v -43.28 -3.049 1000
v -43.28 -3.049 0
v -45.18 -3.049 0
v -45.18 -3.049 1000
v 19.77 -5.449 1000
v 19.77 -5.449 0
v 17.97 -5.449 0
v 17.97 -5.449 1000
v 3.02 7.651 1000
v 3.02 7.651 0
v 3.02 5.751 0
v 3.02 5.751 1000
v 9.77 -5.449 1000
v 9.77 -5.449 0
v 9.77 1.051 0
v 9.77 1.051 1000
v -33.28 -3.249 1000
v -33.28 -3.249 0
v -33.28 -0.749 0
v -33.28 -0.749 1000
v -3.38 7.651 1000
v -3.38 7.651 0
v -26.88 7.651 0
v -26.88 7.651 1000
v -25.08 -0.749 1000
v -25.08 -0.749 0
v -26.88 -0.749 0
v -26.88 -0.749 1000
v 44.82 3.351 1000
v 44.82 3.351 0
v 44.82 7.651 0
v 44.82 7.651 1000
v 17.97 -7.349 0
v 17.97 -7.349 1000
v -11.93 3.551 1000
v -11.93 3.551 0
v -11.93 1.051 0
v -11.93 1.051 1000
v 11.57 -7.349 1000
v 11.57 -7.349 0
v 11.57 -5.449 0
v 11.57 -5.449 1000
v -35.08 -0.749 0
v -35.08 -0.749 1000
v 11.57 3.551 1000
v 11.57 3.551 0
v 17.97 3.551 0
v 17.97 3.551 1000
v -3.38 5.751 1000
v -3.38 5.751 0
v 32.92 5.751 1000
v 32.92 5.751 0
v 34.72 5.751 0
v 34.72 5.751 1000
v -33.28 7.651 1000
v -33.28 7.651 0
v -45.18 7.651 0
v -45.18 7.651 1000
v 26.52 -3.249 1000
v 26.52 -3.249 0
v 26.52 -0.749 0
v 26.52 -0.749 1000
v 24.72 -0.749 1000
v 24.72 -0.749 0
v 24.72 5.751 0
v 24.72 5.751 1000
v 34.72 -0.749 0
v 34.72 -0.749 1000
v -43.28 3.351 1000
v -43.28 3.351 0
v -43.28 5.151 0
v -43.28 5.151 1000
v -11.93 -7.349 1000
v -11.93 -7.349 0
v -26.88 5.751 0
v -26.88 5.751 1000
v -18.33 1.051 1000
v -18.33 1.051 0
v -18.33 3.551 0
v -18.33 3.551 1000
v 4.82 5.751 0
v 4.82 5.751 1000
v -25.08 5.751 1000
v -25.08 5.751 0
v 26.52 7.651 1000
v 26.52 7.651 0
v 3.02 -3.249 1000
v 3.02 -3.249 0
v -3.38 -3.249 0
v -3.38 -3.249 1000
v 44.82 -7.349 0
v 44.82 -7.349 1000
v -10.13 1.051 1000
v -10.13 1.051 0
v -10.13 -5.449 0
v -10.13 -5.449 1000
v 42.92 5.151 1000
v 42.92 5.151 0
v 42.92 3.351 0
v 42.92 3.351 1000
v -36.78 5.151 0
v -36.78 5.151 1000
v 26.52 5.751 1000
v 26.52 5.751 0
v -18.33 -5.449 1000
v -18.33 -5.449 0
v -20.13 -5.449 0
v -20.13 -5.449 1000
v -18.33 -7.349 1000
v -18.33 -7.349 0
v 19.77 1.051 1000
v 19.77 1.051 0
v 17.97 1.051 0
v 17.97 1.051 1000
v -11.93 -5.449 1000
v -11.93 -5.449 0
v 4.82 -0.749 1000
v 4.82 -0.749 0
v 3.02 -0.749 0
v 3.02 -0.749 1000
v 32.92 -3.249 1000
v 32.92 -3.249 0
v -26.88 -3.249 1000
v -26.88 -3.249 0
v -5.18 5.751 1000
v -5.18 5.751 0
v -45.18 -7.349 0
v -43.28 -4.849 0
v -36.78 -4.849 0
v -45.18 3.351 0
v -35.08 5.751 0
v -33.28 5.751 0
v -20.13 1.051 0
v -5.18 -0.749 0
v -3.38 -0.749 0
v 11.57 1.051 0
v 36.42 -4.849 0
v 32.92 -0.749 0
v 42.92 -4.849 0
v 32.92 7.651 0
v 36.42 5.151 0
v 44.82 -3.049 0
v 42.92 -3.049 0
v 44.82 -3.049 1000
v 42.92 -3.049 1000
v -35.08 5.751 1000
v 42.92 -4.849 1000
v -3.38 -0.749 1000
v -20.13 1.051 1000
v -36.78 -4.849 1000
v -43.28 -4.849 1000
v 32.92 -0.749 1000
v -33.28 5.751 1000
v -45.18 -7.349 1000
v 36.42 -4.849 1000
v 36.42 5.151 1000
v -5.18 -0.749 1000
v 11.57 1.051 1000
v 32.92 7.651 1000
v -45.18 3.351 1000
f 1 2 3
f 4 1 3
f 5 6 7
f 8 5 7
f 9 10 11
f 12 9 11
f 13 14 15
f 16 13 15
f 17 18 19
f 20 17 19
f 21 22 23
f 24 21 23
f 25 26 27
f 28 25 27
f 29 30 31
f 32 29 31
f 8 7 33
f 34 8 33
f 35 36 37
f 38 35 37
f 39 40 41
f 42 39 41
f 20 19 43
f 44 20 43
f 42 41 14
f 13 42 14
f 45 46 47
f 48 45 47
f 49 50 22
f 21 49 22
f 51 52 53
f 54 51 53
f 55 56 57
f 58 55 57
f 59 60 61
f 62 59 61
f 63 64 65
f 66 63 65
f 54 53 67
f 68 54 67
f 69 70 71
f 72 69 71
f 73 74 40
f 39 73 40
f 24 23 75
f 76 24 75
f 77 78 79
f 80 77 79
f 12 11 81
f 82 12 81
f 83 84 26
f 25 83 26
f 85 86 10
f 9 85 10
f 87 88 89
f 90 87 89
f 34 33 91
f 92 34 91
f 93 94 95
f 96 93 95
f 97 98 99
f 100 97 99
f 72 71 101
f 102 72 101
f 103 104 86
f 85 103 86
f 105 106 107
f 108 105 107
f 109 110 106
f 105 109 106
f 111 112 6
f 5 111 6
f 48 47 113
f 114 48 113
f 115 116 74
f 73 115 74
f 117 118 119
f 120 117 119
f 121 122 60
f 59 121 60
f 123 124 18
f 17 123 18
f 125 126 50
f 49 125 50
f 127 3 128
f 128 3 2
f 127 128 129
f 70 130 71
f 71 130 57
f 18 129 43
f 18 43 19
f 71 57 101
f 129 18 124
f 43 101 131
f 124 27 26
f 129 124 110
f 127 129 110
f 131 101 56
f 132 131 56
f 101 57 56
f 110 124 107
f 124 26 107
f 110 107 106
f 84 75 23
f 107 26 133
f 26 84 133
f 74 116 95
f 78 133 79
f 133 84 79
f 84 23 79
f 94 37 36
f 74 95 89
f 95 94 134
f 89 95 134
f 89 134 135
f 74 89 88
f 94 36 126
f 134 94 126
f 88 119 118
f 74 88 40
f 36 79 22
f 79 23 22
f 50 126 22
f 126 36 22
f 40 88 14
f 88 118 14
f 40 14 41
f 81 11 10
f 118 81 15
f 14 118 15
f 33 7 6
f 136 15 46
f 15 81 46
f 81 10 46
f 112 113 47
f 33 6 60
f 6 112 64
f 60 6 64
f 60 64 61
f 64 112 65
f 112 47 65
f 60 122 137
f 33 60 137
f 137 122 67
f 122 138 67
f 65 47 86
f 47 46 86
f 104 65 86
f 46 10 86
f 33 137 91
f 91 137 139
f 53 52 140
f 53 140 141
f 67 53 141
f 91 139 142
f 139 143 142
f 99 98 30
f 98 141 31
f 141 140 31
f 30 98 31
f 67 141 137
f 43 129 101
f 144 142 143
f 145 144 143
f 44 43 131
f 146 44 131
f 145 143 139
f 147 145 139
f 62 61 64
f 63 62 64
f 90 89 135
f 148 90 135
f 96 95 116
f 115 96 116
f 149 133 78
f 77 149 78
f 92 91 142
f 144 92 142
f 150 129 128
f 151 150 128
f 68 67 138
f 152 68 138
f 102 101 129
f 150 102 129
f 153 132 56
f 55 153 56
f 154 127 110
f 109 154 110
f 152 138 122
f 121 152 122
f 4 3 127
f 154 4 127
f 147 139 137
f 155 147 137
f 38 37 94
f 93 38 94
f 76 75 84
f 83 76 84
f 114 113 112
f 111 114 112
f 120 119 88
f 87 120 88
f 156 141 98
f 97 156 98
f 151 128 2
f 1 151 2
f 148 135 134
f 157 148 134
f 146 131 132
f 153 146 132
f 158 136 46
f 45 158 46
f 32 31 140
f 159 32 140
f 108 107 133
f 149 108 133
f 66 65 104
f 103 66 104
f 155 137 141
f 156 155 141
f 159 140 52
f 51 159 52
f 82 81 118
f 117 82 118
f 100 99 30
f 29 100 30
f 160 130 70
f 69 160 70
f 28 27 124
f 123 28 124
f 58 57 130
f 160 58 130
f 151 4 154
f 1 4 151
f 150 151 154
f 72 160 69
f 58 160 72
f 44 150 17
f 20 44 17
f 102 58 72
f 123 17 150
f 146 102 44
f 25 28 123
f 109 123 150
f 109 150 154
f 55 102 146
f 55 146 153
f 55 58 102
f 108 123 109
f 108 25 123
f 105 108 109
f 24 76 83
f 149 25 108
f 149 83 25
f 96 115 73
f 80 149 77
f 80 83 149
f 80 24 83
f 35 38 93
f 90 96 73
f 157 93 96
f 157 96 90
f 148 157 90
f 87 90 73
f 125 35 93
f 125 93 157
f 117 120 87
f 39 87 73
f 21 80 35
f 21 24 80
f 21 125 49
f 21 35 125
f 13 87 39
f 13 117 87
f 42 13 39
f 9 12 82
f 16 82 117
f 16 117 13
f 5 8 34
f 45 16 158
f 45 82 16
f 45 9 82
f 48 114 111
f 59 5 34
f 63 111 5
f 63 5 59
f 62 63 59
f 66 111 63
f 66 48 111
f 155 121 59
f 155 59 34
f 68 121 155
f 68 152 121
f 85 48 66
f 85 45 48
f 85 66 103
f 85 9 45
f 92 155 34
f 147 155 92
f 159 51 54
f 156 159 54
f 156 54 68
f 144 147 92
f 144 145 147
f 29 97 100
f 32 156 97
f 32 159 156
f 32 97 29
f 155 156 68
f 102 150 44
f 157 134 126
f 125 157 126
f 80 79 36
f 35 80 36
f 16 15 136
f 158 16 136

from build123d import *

# Parameters (mm, degrees)
EXTRUDE_1_DEPTH = 1000


with BuildPart() as part:
    # 草图1 → 凸台-拉伸1 (new body)
    with BuildSketch(Plane.XY):
        Polygon((-20.130003001, 1.051402525), (-18.330003001, 1.051402525), (-18.330003001, 3.551402525), (-11.930003001, 3.551402525), (-11.930003001, 1.051402525), (-10.130003001, 1.051402525), (-10.130003001, -5.448597475), (-11.930003001, -5.448597475), (-11.930003001, -7.348597475), (11.569996999, -7.348597475), (11.569996999, -5.448597475), (9.769996999, -5.448597475), (9.769996999, 1.051402525), (11.569996999, 1.051402525), (11.569996999, 3.551402525), (17.969996999, 3.551402525), (17.969996999, 1.051402525), (19.769996999, 1.051402525), (19.769996999, -5.448597475), (17.969996999, -5.448597475), (17.969996999, -7.348597475), (44.819996999, -7.348597475), (44.819996999, -3.048597475), (42.919996999, -3.048597475), (42.919996999, -4.848597475), (36.419996999, -4.848597475), (36.419996999, 5.151402525), (42.919996999, 5.151402525), (42.919996999, 3.351402525), (44.819996999, 3.351402525), (44.819996999, 7.651402525), (32.919996999, 7.651402525), (32.919996999, 5.751402525), (34.719996999, 5.751402525), (34.719996999, -0.748597475), (32.919996999, -0.748597475), (32.919996999, -3.248597475), (26.519996999, -3.248597475), (26.519996999, -0.748597475), (24.719996999, -0.748597475), (24.719996999, 5.751402525), (26.519996999, 5.751402525), (26.519996999, 7.651402525), (3.019996999, 7.651402525), (3.019996999, 5.751402525), (4.819996999, 5.751402525), (4.819996999, -0.748597475), (3.019996999, -0.748597475), (3.019996999, -3.248597475), (-3.380003001, -3.248597475), (-3.380003001, -0.748597475), (-5.180003001, -0.748597475), (-5.180003001, 5.751402525), (-3.380003001, 5.751402525), (-3.380003001, 7.651402525), (-26.880003001, 7.651402525), (-26.880003001, 5.751402525), (-25.080003001, 5.751402525), (-25.080003001, -0.748597475), (-26.880003001, -0.748597475), (-26.880003001, -3.248597475), (-33.280003001, -3.248597475), (-33.280003001, -0.748597475), (-35.080003001, -0.748597475), (-35.080003001, 5.751402525), (-33.280003001, 5.751402525), (-33.280003001, 7.651402525), (-45.180003001, 7.651402525), (-45.180003001, 3.351402525), (-43.280003001, 3.351402525), (-43.280003001, 5.151402525), (-36.780003001, 5.151402525), (-36.780003001, -4.848597475), (-43.280003001, -4.848597475), (-43.280003001, -3.048597475), (-45.180003001, -3.048597475), (-45.180003001, -7.348597475), (-18.330003001, -7.348597475), (-18.330003001, -5.448597475), (-20.130003001, -5.448597475), align=None)
    extrude(amount=EXTRUDE_1_DEPTH)


solid = part.part
